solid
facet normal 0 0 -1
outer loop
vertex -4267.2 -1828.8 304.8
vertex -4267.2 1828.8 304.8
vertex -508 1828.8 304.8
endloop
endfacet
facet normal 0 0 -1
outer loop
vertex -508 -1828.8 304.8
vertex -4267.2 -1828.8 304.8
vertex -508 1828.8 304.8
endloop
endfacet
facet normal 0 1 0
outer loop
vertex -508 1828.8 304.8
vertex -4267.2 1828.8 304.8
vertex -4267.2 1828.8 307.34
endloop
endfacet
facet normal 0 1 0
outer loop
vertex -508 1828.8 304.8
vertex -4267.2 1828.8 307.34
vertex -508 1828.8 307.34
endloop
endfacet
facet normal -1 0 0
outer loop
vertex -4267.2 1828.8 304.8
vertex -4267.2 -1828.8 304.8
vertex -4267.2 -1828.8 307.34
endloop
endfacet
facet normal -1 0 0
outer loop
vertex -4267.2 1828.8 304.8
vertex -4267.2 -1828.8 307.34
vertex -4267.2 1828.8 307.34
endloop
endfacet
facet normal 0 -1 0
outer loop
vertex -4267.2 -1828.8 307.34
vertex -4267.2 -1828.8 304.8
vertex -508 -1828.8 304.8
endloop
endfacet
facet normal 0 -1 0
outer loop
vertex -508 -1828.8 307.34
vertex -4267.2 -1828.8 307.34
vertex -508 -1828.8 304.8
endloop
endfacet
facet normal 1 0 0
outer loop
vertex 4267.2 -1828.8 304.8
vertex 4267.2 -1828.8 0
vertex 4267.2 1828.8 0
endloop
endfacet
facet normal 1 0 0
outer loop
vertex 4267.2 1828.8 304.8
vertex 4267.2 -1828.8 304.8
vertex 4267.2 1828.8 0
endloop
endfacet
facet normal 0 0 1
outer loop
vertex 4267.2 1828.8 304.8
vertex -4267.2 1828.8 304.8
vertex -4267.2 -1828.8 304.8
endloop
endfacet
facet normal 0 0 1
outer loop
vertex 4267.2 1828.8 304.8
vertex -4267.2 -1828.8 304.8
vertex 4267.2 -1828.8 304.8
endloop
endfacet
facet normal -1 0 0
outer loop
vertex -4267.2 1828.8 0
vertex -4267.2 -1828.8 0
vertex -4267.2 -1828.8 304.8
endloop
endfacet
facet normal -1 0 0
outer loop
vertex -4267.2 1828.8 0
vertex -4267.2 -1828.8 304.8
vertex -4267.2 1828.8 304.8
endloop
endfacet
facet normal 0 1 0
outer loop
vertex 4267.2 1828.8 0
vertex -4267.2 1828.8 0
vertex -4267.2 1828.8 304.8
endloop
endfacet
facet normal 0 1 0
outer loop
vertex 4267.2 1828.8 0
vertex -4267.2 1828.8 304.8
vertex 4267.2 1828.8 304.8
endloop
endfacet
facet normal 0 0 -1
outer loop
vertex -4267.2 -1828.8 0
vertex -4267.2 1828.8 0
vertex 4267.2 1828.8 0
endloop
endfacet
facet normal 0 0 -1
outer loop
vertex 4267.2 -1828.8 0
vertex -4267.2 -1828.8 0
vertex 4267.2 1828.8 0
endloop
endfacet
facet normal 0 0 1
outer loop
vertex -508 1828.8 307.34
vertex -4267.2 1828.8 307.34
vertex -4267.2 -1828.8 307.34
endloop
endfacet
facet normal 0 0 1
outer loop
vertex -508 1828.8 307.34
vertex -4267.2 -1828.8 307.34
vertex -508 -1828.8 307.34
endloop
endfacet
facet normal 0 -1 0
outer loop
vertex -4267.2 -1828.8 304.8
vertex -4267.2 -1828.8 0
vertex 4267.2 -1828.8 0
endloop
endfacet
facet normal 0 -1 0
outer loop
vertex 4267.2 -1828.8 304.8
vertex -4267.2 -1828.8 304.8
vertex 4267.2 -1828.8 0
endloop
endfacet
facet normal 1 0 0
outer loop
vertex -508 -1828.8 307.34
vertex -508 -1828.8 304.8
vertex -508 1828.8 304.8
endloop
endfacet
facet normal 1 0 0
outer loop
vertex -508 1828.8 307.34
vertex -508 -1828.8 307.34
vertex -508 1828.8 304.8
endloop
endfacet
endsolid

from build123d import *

# Parameters (mm, degrees)
F0_W     = 8534.4
F0_H     = 3657.6
F1_DEPTH = 304.8
F2_W     = 3759.2
F2_H     = 3657.6
F3_DEPTH = 2.54


with BuildPart() as f1:
    # F0 (on Top) → F1 (new body)
    with BuildSketch(Plane.XY):
        Rectangle(F0_W, F0_H)
    extrude(amount=F1_DEPTH)


with BuildPart() as f3:
    # F2 (on face) → F3 (new body)
    with BuildSketch(Plane.XY.offset(304.8)):
        with Locations((-2387.6, 0)):
            Rectangle(F2_W, F2_H)
    extrude(amount=F3_DEPTH)


solid = Compound([f1.part, f3.part])
